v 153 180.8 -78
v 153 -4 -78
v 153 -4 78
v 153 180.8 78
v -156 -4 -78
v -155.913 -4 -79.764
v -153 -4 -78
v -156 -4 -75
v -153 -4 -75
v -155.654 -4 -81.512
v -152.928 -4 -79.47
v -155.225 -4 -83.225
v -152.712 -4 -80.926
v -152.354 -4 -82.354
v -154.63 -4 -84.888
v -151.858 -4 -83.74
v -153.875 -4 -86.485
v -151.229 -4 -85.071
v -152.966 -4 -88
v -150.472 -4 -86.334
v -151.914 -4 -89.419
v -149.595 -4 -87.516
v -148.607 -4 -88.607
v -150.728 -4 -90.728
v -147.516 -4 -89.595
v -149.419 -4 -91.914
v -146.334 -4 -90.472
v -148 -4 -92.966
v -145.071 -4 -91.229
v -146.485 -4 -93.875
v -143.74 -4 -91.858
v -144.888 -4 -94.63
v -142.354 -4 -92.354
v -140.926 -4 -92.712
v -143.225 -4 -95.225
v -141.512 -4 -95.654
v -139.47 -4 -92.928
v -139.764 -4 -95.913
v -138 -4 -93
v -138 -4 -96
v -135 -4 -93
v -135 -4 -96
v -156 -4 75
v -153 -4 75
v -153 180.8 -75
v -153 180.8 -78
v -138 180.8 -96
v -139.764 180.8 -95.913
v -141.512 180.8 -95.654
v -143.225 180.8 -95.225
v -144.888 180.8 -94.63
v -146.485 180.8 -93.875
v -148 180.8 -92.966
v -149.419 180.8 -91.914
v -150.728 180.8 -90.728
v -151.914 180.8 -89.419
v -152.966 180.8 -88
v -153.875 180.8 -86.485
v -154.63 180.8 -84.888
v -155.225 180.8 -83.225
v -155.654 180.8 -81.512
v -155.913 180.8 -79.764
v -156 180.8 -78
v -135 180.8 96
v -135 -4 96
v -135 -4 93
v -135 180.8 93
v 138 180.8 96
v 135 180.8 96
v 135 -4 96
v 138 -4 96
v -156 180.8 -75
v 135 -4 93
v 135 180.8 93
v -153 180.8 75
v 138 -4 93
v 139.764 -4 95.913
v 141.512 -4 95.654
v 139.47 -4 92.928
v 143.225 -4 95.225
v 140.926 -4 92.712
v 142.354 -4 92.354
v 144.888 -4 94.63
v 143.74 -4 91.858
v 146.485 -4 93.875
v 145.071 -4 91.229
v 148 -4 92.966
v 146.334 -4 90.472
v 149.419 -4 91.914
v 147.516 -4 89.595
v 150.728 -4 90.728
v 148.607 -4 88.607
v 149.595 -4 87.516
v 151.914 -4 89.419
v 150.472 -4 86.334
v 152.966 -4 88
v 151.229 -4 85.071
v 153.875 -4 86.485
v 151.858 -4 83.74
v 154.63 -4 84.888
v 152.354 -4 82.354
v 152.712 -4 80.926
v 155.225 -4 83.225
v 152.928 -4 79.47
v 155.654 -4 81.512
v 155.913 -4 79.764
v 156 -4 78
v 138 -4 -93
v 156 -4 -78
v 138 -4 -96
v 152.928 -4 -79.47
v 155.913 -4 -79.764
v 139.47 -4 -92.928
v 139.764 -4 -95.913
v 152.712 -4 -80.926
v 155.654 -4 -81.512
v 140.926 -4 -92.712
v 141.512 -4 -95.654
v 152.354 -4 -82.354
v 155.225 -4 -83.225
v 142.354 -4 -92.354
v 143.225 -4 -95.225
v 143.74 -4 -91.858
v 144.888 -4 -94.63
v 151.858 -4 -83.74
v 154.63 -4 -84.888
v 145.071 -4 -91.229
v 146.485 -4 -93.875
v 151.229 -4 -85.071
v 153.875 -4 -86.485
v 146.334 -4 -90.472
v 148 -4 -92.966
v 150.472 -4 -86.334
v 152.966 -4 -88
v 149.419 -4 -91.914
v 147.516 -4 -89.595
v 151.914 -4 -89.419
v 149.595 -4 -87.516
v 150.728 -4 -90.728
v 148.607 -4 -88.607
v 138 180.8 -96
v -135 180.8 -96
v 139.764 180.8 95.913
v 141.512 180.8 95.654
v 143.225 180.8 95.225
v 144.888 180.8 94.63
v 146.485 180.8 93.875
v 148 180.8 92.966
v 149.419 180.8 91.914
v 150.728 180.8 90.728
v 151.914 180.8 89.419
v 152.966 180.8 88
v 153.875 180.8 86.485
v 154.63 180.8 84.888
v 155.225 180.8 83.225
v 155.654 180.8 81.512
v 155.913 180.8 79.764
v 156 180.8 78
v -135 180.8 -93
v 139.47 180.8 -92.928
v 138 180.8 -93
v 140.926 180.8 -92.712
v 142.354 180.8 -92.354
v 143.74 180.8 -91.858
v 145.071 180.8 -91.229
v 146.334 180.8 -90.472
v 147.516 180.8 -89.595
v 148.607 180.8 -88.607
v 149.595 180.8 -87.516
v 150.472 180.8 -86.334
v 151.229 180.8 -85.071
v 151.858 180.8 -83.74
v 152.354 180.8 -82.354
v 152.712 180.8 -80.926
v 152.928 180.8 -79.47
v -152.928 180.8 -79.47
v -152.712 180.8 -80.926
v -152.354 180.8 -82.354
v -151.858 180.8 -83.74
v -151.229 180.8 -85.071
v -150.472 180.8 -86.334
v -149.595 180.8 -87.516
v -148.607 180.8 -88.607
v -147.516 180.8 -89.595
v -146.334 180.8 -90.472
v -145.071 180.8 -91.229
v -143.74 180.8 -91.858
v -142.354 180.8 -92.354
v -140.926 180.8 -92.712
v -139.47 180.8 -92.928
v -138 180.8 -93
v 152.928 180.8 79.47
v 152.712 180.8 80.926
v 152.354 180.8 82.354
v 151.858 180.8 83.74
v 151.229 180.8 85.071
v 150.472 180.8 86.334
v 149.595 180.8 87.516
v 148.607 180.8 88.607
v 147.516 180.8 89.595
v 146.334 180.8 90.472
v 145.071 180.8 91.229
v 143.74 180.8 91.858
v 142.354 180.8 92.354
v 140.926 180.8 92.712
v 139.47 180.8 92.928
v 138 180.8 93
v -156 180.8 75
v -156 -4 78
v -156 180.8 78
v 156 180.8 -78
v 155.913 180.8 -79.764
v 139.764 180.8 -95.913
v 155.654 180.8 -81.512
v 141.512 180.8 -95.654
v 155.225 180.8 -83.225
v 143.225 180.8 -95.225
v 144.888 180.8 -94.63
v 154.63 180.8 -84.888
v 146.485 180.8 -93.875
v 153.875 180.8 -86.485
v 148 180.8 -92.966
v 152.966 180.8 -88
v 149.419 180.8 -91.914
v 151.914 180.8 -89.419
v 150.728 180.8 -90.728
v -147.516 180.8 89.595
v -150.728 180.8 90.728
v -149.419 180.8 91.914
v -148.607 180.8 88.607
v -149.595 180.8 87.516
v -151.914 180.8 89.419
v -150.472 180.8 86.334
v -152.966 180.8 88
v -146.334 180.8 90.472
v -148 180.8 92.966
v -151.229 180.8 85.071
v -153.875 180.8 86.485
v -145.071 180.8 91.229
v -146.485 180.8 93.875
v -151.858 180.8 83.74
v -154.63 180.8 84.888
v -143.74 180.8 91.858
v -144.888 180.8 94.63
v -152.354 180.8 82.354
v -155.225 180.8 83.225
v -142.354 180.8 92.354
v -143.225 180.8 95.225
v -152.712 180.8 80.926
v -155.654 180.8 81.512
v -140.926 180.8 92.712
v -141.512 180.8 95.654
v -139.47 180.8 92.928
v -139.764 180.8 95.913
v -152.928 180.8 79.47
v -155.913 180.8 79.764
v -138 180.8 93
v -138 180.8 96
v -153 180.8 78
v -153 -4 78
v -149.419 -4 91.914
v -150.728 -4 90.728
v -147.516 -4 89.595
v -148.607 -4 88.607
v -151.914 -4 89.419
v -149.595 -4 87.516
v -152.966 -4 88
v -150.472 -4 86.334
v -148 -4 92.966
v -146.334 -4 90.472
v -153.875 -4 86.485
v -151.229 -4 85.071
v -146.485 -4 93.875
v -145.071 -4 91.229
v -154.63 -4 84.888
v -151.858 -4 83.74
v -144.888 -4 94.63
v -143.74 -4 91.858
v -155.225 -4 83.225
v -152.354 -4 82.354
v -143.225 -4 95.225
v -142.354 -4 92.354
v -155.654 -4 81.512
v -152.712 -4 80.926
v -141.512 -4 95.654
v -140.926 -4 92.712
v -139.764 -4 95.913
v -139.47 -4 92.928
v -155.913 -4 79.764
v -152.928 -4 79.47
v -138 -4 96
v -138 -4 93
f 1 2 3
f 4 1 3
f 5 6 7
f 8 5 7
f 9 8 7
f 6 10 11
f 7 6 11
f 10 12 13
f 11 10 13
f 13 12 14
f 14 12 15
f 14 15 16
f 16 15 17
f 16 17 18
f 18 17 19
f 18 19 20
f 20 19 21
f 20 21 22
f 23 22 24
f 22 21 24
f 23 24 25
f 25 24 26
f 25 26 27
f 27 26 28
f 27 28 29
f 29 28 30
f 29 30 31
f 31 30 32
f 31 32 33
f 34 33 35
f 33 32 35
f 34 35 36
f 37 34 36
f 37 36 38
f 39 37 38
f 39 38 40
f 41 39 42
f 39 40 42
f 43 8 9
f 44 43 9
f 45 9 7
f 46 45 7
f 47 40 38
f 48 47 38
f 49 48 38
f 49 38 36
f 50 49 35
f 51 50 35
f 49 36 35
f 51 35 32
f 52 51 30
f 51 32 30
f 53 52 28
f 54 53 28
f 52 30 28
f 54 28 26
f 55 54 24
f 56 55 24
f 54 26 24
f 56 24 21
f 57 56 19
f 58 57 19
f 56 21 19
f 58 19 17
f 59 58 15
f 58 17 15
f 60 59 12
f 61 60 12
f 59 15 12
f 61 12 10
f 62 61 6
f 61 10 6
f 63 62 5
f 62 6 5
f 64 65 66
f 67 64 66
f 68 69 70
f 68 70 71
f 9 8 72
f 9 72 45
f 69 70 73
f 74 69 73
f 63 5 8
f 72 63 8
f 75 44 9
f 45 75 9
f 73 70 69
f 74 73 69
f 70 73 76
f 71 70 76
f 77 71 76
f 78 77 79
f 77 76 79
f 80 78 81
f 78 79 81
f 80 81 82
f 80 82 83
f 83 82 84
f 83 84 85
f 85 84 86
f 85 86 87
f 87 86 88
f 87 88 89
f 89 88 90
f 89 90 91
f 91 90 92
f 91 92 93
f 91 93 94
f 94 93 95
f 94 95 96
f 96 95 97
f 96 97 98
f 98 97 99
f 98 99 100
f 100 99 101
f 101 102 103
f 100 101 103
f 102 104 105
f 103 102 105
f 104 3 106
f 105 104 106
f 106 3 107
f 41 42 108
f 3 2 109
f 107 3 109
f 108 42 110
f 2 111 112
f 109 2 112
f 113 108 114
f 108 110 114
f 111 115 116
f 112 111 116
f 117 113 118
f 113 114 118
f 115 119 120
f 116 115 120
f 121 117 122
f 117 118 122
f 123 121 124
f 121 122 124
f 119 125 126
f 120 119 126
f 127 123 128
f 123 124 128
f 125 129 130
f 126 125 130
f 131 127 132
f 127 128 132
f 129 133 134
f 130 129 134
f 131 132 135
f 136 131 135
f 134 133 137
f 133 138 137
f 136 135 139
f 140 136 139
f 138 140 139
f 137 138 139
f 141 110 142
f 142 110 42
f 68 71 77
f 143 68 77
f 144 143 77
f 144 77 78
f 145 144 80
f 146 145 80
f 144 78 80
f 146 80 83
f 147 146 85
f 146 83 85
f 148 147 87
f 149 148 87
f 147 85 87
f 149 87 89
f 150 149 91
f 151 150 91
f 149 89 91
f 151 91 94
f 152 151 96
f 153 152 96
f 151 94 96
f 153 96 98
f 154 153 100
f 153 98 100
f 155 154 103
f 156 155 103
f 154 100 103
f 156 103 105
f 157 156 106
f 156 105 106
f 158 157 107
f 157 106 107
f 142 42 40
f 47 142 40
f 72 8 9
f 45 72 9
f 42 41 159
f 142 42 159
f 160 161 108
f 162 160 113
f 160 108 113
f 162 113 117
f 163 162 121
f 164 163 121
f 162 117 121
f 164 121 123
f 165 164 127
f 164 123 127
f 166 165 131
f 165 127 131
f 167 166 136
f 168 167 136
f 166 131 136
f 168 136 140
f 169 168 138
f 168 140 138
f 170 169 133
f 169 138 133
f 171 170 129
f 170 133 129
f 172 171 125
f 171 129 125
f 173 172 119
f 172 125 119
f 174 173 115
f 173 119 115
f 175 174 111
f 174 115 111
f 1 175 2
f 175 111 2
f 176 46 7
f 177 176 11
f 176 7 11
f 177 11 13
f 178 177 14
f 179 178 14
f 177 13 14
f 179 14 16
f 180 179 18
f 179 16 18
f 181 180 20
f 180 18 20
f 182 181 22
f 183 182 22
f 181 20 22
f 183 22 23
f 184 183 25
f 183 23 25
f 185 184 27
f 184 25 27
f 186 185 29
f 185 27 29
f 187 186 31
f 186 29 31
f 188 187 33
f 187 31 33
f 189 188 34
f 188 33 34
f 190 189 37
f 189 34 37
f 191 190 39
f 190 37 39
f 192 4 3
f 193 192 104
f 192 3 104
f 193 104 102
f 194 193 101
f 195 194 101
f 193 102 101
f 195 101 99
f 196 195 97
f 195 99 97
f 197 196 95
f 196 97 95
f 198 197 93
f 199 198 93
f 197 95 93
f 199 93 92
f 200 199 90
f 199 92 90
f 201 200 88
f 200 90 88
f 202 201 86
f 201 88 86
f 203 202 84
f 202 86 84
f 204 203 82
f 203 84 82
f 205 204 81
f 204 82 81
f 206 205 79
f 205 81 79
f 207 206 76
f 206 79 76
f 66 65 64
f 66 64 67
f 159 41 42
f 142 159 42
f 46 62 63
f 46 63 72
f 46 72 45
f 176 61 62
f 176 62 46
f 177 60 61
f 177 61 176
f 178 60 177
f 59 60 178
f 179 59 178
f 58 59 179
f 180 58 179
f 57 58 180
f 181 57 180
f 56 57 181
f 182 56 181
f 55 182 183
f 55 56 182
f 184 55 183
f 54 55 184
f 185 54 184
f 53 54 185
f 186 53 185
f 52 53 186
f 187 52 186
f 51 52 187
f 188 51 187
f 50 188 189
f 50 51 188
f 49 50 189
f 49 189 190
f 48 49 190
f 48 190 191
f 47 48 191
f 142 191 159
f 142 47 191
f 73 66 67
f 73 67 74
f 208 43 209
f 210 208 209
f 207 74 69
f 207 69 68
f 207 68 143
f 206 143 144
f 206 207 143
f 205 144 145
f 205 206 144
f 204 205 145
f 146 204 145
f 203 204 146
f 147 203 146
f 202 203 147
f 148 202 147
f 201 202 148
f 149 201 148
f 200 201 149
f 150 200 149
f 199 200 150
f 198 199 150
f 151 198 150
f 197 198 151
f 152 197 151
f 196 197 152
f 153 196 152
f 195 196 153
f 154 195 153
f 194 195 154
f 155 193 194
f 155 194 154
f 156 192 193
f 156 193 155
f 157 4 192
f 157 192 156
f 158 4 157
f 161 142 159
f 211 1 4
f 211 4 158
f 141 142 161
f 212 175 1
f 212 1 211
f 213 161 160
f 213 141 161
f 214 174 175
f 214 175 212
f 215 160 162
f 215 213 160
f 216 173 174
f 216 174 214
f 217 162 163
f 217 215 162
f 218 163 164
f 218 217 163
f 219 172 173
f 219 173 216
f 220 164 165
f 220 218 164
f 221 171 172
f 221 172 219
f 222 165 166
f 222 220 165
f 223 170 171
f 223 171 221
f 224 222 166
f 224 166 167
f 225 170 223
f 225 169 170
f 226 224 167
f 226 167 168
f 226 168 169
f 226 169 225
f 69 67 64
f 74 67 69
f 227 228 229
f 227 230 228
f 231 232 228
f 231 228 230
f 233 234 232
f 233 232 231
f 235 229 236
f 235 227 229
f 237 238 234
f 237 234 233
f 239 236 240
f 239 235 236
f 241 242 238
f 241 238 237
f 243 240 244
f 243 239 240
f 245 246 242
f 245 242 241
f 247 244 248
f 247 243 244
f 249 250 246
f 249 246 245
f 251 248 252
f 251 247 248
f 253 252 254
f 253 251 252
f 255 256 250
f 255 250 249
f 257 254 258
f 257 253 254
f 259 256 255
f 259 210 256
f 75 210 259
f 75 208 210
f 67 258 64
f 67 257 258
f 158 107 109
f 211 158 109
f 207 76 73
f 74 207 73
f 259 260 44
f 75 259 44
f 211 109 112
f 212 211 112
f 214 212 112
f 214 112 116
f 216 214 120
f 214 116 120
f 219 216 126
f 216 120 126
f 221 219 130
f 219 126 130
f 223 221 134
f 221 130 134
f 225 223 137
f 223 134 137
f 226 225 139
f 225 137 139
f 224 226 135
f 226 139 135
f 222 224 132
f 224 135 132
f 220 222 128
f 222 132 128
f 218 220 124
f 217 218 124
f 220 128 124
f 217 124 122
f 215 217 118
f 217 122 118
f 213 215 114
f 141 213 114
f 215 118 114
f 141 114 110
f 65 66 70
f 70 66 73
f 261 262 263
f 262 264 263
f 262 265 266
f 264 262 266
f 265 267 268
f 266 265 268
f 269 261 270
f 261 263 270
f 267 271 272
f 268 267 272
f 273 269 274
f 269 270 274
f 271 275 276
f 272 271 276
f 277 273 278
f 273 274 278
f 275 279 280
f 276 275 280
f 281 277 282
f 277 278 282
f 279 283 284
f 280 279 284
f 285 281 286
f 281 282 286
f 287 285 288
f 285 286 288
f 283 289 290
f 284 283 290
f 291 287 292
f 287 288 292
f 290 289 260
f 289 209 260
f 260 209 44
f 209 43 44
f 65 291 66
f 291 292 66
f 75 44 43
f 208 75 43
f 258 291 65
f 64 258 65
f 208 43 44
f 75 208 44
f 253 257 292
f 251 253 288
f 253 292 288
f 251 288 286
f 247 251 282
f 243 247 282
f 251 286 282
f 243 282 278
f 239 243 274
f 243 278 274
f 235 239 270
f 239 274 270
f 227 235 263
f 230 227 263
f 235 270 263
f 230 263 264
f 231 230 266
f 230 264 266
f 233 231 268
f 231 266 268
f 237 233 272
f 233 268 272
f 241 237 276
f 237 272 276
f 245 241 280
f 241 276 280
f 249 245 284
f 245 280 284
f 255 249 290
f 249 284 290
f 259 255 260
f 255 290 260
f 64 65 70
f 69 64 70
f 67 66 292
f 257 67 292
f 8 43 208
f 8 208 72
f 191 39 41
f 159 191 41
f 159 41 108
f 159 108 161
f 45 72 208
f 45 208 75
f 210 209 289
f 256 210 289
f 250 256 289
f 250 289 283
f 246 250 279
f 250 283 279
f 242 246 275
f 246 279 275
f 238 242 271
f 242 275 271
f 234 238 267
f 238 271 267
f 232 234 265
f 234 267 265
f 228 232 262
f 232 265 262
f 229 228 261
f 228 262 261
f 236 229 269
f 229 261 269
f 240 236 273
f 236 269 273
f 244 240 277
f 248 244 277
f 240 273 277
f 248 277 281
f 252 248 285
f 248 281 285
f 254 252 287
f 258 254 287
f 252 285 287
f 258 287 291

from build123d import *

# Parameters (mm, degrees)
BOSS_EXTRUDE1_DEPTH      = 180.8
BOSS_EXTRUDE1_DEPTH_BACK = 4
SPLIT1_START             = -4
SPLIT1_OUTLINE_W         = 270
SPLIT1_OUTLINE_H         = 3
SPLIT1_DEPTH             = 184.8
SPLIT1_2_OUTLINE_W       = 3
SPLIT1_2_OUTLINE_H       = 150
SPLIT1_2_DEPTH           = 184.8
SPLIT1_3_DEPTH           = 184.8
SPLIT1_4_DEPTH           = 184.8
SPLIT1_START_2           = -156
SPLIT1_5_OUTLINE_W       = 184.8
SPLIT1_5_OUTLINE_H       = 189
SPLIT1_5_DEPTH           = 291
SPLIT1_START_3           = -151.250554839
SPLIT1_6_OUTLINE_W       = 184.8
SPLIT1_6_OUTLINE_H       = 3
SPLIT1_6_DEPTH           = 16.250554839


# Read off the part's stored shape, not the designer's step: Split1
with BuildPart() as part:
    # Sketch1 → Boss-Extrude1 (new, two sides: drawn at the far end of the back side and taken through both)
    with BuildSketch(Plane(origin=(0, 0, 0), x_dir=(1, 0, 0), z_dir=(0, 1, 0)).offset(-BOSS_EXTRUDE1_DEPTH_BACK)):
        with BuildLine():
            Line((-156, 78), (-156, -78))
            ThreePointArc((-156, -78), (-150.727922061, -90.727922061), (-138, -96))
            Line((-138, -96), (138, -96))
            ThreePointArc((138, -96), (150.727922061, -90.727922061), (156, -78))
            Line((156, -78), (156, 78))
            ThreePointArc((156, 78), (150.727922061, 90.727922061), (138, 96))
            Line((138, 96), (-138, 96))
            ThreePointArc((-138, 96), (-150.727922061, 90.727922061), (-156, 78))
        make_face()
        with BuildLine():
            Line((-138, 93), (138, 93))
            ThreePointArc((138, 93), (148.606601718, 88.606601718), (153, 78))
            Line((153, 78), (153, -78))
            ThreePointArc((153, -78), (148.606601718, -88.606601718), (138, -93))
            Line((138, -93), (-138, -93))
            ThreePointArc((-138, -93), (-148.606601718, -88.606601718), (-153, -78))
            Line((-153, -78), (-153, 78))
            ThreePointArc((-153, 78), (-148.606601718, 88.606601718), (-138, 93))
        make_face(mode=Mode.SUBTRACT)
    extrude(amount=BOSS_EXTRUDE1_DEPTH + BOSS_EXTRUDE1_DEPTH_BACK)

    # Split1 5 outline → Split1 5 (cut)
    with BuildSketch(Plane.YZ.offset(SPLIT1_START_2)):
        with Locations((88.4, 1.5)):
            Rectangle(SPLIT1_5_OUTLINE_W, SPLIT1_5_OUTLINE_H)
    extrude(amount=SPLIT1_5_DEPTH, mode=Mode.SUBTRACT)

    # Split1 6 outline → Split1 6 (cut)
    with BuildSketch(Plane.YZ.offset(SPLIT1_START_3)):
        with Locations((88.4, -94.5)):
            Rectangle(SPLIT1_6_OUTLINE_W, SPLIT1_6_OUTLINE_H)
    extrude(amount=SPLIT1_6_DEPTH, mode=Mode.SUBTRACT)


with BuildPart() as body_2:
    # Split1 outline → Split1 (new body)
    with BuildSketch(Plane(origin=(0, 0, 0), x_dir=(1, 0, 0), z_dir=(0, 1, 0)).offset(SPLIT1_START)):
        with Locations((0, -94.5)):
            Rectangle(SPLIT1_OUTLINE_W, SPLIT1_OUTLINE_H)
    extrude(amount=SPLIT1_DEPTH)


with BuildPart() as body_3:
    # Split1 2 outline → Split1 2 (new body)
    with BuildSketch(Plane(origin=(0, 0, 0), x_dir=(1, 0, 0), z_dir=(0, 1, 0)).offset(SPLIT1_START)):
        with Locations((-154.5, 0)):
            Rectangle(SPLIT1_2_OUTLINE_W, SPLIT1_2_OUTLINE_H)
    extrude(amount=SPLIT1_2_DEPTH)


with BuildPart() as body_4:
    # Split1 3 outline → Split1 3 (new body)
    with BuildSketch(Plane(origin=(0, 0, 0), x_dir=(1, 0, 0), z_dir=(0, 1, 0)).offset(SPLIT1_START)):
        with BuildLine():
            Line((-138, 93), (-135, 93))
            Line((-135, 93), (-135, 96))
            Line((-135, 96), (-138, 96))
            ThreePointArc((-138, 96), (-150.727922061, 90.727922061), (-156, 78))
            Line((-156, 78), (-156, 75))
            Line((-156, 75), (-153, 75))
            Line((-153, 75), (-153, 78))
            ThreePointArc((-153, 78), (-148.606601718, 88.606601718), (-138, 93))
        make_face()
    extrude(amount=SPLIT1_3_DEPTH)


with BuildPart() as body_5:
    # Split1 4 outline → Split1 4 (new body)
    with BuildSketch(Plane(origin=(0, 0, 0), x_dir=(1, 0, 0), z_dir=(0, 1, 0)).offset(SPLIT1_START)):
        with BuildLine():
            Line((-138, -96), (-135, -96))
            Line((-135, -96), (-135, -93))
            Line((-135, -93), (-138, -93))
            ThreePointArc((-138, -93), (-148.606601718, -88.606601718), (-153, -78))
            Line((-153, -78), (-153, -75))
            Line((-153, -75), (-156, -75))
            Line((-156, -75), (-156, -78))
            ThreePointArc((-156, -78), (-150.727922061, -90.727922061), (-138, -96))
        make_face()
    extrude(amount=SPLIT1_4_DEPTH)


solid = Compound([part.part, body_2.part, body_3.part, body_4.part, body_5.part])
